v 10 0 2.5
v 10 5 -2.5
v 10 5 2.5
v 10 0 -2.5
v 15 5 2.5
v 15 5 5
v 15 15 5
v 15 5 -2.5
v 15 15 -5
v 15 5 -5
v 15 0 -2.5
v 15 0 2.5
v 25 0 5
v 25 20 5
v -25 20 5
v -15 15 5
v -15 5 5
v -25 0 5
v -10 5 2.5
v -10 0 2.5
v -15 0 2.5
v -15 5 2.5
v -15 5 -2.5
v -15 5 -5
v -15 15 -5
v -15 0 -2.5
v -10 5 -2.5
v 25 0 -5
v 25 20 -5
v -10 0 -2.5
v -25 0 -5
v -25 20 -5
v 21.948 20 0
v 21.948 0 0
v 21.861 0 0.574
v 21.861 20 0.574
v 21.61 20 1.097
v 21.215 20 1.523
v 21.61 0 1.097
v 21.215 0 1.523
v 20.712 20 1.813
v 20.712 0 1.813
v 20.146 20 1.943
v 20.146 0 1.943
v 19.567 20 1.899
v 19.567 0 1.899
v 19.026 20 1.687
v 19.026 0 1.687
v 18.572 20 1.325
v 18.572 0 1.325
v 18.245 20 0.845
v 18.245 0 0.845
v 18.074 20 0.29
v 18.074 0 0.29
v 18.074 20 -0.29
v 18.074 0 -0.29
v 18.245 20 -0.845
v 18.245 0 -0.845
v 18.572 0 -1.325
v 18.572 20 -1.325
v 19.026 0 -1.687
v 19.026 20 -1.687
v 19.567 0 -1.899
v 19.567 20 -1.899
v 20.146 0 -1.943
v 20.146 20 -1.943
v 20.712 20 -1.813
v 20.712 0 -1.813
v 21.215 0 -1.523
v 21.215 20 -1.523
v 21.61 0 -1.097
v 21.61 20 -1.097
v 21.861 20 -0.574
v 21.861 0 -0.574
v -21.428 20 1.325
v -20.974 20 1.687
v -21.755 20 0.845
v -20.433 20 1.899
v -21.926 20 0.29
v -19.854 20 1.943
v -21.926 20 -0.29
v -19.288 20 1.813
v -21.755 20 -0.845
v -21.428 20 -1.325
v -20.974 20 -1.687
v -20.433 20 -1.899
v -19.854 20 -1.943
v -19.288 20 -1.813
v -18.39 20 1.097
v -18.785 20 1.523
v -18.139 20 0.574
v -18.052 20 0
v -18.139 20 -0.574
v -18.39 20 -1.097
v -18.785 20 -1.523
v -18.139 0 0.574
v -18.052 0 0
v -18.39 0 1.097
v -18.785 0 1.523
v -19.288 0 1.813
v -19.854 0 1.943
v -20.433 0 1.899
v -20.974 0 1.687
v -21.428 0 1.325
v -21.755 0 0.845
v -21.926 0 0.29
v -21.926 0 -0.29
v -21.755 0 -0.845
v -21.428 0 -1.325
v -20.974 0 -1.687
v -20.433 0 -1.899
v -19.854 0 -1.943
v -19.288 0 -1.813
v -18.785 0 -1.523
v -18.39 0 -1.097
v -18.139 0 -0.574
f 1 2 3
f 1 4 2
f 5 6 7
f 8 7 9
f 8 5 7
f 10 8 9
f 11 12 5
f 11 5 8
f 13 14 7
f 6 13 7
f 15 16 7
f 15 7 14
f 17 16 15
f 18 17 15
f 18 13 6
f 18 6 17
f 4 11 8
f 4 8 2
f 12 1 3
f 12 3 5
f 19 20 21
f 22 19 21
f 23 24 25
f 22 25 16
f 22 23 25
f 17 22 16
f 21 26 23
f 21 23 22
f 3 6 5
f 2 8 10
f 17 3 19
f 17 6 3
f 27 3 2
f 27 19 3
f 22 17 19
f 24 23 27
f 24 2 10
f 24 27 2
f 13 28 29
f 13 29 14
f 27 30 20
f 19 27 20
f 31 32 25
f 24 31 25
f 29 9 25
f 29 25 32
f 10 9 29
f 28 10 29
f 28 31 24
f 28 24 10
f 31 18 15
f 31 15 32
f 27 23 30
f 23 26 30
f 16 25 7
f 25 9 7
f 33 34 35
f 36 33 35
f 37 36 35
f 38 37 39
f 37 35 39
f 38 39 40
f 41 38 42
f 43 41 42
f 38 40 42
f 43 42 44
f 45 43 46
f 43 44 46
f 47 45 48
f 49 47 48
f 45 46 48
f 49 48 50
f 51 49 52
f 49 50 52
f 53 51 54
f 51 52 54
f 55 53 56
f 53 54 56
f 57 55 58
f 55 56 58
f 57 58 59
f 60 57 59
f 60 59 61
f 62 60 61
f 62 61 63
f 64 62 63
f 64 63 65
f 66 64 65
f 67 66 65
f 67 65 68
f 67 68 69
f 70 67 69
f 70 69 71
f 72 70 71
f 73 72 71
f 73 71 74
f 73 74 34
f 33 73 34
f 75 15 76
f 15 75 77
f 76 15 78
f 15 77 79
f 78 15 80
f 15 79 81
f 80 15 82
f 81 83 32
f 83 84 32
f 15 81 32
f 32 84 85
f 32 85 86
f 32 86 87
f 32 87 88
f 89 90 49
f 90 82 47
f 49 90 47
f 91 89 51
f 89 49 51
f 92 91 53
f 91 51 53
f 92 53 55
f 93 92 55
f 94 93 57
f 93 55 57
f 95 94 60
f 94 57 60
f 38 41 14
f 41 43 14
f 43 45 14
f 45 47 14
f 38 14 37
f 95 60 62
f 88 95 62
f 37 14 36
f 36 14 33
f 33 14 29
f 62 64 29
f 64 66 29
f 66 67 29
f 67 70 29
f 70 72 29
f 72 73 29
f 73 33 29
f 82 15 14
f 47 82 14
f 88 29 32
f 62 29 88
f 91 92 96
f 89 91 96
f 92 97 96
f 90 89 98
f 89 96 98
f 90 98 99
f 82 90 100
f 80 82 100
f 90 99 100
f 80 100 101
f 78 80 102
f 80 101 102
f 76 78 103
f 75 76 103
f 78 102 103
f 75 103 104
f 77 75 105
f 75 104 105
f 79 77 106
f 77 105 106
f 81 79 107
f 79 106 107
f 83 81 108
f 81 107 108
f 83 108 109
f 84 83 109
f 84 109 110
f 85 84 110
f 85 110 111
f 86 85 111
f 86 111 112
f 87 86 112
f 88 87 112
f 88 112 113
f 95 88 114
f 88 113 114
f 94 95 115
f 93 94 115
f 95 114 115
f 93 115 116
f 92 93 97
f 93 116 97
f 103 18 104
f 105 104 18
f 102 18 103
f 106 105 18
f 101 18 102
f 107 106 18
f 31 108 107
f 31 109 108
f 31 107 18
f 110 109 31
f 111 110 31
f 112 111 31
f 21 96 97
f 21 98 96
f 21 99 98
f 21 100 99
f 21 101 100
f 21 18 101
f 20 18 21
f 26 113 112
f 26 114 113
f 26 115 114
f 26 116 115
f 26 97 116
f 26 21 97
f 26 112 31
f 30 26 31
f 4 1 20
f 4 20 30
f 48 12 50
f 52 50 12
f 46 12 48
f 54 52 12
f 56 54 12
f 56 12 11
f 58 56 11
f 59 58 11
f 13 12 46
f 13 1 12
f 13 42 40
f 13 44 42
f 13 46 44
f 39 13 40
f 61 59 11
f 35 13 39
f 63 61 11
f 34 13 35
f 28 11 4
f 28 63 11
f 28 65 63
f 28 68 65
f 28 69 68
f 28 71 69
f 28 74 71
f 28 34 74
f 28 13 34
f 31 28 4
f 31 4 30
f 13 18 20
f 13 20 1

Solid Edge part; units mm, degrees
sketch "Sketch1" plane through (0, 0, 0) normal (0, -1, 0) x (1, 0, 0)
  line L0 (-25, -5) -> (25, -5)
  line L1 (25, -5) -> (25, 5)
  line L2 (25, 5) -> (-25, 5)
  line L3 (-25, 5) -> (-25, -5)
  dimension "D1" = 50
  dimension "D2" = 5
extrude "Protrusion1" add sketch "Sketch1" against normal blind 20
sketch "Sketch2" plane through (0, 0, 0) normal (0, -1, 0) x (1, 0, 0)
  circle A0 centre (-20, 0) radius 1.948
  circle A1 centre (20, 0) radius 1.948
  dimension "D1" = 40
  dimension "D2" = 5
extrude "Cutout1" cut sketch "Sketch2" against normal through all
sketch "Sketch3" plane through (0, 0, 0) normal (0, -1, 0) x (1, 0, 0)
  line L0 (-15, 5) -> (15, 5)
  line L1 (15, 5) -> (15, -5)
  line L2 (15, -5) -> (-15, -5)
  line L3 (-15, -5) -> (-15, 5)
  dimension "D1" = 10
  dimension "D2" = 10
extrude "Extrusionsausschnitt_3" cut sketch "Sketch3" against normal blind 15
sketch "Sketch4" plane through (-15, 7.5, 0) normal (1, 0, 0) x (0, 1, 0)
  line L0 (-7.5, 5) -> (-2.5, 5)
  line L1 (-2.5, 5) -> (-2.5, -5)
  line L2 (-2.5, -5) -> (-7.5, -5)
  line L3 (-7.5, -5) -> (-7.5, 5)
  dimension "D1" = 5
extrude "Extrusionsausprägung_2" add sketch "Sketch4" along normal blind 30
sketch "Sketch5" plane through (0, 0, 0) normal (0, -1, 0) x (1, 0, 0)
  line L0 (-15, -2.5) -> (-10, -2.5)
  line L1 (-10, -2.5) -> (-10, 2.5)
  line L2 (-10, 2.5) -> (-15, 2.5)
  line L3 (-15, 2.5) -> (-15, -2.5)
  line L4 (15, -2.5) -> (10, -2.5)
  line L5 (10, -2.5) -> (10, 2.5)
  line L6 (10, 2.5) -> (15, 2.5)
  line L7 (15, 2.5) -> (15, -2.5)
  dimension "D1" = 5
  dimension "D2" = 5
  dimension "D3" = 5
extrude "Cutout2" cut sketch "Sketch5" against normal up to next
properties material "Nylon, allgemein"
